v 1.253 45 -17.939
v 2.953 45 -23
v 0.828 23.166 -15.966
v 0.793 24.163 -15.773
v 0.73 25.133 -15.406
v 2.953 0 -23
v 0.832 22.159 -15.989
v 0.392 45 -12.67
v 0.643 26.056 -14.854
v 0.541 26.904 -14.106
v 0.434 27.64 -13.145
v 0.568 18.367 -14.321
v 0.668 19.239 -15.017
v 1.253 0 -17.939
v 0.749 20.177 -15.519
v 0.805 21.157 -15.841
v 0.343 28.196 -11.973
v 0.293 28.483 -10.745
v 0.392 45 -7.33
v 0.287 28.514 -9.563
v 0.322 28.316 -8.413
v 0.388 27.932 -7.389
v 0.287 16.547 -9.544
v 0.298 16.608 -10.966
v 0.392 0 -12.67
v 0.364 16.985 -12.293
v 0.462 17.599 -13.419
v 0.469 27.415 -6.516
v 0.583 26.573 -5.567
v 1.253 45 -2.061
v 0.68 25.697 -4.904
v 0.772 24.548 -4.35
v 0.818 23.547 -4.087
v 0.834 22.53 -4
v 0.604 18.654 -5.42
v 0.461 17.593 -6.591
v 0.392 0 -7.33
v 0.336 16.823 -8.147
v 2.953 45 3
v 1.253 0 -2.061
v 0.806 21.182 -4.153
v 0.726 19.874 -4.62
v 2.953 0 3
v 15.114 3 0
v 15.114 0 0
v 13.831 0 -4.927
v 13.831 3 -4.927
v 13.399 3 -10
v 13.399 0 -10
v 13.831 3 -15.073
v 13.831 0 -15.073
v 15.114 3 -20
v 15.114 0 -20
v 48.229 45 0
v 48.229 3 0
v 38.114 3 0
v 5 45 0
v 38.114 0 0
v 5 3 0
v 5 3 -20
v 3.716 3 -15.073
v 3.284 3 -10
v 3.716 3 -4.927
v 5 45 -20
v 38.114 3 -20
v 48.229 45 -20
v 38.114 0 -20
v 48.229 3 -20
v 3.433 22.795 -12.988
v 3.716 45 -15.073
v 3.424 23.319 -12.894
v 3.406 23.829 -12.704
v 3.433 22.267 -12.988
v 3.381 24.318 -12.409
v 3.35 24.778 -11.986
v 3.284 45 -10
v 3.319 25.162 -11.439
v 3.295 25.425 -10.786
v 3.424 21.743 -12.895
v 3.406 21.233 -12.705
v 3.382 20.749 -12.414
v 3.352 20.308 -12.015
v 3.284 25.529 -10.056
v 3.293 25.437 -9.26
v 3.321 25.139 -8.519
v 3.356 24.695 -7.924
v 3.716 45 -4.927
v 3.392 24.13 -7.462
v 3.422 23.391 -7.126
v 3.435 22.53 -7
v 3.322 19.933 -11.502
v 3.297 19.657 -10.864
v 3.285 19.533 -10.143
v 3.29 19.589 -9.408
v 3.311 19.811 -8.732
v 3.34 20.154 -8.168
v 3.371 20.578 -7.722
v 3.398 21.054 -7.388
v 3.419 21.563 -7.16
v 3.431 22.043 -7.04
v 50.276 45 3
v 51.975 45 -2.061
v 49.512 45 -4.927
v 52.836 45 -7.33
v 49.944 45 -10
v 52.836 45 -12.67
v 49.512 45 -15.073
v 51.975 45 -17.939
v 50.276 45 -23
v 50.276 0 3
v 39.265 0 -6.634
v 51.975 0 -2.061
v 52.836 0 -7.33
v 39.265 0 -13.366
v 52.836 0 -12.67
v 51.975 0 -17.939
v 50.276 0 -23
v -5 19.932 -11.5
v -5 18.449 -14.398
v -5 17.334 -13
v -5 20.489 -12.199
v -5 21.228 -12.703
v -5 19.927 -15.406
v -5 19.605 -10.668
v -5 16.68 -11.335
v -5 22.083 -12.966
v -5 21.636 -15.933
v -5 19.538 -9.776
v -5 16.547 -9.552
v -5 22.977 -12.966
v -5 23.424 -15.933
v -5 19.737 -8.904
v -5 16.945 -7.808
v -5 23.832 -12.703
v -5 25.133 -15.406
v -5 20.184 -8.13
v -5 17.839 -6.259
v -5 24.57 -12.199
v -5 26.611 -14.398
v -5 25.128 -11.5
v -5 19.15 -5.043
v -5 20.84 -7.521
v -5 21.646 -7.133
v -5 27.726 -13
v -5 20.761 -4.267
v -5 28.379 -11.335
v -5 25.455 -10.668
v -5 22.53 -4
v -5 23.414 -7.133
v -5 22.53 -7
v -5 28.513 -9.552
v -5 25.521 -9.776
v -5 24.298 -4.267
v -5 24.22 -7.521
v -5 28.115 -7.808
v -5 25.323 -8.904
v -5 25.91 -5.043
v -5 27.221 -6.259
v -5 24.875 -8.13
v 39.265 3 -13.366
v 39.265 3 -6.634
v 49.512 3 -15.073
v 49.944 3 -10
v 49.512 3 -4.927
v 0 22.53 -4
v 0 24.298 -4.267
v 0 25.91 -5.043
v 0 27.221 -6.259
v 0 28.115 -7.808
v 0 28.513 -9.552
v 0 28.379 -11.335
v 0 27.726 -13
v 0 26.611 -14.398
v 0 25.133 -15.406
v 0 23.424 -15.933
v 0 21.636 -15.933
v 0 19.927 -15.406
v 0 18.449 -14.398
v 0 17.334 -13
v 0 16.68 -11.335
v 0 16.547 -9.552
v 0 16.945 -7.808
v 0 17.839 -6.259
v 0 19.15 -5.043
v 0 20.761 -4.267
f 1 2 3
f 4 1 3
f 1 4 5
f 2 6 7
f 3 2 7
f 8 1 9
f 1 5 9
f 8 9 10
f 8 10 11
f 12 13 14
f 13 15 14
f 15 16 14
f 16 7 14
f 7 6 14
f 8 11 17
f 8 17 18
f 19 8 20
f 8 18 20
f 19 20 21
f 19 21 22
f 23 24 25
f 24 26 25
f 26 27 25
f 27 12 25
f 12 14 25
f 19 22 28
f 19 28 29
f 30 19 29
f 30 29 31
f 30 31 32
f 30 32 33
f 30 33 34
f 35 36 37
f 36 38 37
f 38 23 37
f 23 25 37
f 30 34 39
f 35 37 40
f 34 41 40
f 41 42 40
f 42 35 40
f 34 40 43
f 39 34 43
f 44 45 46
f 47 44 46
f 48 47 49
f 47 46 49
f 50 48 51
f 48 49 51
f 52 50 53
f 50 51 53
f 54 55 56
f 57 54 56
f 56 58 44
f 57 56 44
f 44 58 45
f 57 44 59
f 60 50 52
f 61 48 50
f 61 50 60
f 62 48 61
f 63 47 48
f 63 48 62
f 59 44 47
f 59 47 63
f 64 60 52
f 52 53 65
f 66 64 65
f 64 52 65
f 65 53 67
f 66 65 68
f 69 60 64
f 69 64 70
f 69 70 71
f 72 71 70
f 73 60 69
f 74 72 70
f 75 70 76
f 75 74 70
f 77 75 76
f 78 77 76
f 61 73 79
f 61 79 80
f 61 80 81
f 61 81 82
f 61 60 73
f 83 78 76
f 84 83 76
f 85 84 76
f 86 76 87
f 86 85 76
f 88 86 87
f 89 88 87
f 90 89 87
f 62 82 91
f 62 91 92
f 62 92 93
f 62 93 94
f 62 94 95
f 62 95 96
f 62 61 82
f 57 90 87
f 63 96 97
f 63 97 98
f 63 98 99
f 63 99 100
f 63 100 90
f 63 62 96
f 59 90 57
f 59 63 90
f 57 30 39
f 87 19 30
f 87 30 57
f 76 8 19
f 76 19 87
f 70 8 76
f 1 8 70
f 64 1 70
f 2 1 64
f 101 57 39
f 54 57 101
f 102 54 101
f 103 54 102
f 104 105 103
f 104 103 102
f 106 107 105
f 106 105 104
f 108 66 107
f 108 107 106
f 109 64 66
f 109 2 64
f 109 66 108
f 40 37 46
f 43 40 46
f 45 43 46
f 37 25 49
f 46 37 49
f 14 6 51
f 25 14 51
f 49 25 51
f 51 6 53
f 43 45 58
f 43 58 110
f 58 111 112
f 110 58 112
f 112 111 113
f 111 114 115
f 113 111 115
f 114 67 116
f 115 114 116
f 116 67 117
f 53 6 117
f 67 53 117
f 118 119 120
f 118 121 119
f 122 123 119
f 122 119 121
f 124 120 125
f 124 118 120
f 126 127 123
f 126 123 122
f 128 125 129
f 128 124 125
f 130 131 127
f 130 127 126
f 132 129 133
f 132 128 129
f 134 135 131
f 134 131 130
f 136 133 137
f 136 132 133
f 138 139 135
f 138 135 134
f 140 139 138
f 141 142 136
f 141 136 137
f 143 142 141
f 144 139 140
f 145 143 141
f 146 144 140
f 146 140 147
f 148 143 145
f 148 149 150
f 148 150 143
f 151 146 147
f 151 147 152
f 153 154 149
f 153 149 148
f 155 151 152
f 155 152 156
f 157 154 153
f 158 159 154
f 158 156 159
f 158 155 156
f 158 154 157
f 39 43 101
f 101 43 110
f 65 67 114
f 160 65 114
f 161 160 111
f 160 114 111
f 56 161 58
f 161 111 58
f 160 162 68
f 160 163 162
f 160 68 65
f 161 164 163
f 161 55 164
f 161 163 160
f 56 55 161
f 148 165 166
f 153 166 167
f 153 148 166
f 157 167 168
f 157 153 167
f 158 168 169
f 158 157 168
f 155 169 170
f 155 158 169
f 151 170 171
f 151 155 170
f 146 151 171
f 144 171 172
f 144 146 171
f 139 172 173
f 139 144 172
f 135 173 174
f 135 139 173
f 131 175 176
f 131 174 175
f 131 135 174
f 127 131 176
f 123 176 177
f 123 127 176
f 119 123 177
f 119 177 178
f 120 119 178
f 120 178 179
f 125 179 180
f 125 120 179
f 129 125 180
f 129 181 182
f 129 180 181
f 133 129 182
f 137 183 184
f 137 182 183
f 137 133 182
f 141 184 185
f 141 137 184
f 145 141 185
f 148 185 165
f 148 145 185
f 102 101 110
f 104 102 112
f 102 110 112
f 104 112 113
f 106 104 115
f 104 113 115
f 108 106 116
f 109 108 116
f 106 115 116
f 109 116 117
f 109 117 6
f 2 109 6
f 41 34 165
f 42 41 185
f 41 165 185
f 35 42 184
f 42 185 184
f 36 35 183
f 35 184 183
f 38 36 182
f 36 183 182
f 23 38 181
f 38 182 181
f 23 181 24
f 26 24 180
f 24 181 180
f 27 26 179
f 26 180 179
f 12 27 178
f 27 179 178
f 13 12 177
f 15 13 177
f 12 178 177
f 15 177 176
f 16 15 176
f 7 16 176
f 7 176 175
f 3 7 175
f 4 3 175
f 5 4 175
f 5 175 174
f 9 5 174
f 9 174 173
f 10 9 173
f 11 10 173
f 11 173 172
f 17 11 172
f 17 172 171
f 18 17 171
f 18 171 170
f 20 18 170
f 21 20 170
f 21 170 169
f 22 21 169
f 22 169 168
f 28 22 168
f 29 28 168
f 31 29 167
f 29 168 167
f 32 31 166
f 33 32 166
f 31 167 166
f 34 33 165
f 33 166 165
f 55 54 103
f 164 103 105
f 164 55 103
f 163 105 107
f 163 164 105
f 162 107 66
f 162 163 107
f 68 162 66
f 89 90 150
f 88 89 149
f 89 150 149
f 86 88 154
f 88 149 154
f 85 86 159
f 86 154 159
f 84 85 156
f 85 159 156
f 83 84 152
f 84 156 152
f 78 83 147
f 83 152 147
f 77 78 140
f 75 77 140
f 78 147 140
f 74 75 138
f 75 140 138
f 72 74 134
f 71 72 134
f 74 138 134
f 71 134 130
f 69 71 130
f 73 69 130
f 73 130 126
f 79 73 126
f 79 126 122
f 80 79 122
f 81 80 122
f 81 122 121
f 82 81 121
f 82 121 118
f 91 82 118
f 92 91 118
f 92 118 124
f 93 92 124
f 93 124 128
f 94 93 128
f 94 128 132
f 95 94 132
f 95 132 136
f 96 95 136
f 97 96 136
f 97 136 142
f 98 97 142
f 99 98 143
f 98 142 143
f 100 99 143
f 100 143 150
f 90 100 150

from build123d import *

# Parameters (mm, degrees)
SALIENTE_EXTRUIR1_DEPTH      = 45
SALIENTE_EXTRUIR2_DEPTH      = 3
SALIENTE_EXTRUIR3_REACH      = 75.192
SALIENTE_EXTRUIR3_END_RADIUS = 33
CROQUIS3_R                   = 6
SALIENTE_EXTRUIR4_START      = 5
CROQUIS4_R                   = 6
SALIENTE_EXTRUIR4_DEPTH      = 5
CROQUIS5_R                   = 3
CORTAR_EXTRUIR1_DEPTH        = 12


with BuildPart() as part:
    # Croquis1 → Saliente-Extruir1 (new body)
    with BuildSketch(Plane(origin=(0, 0, 0), x_dir=(1, 0, 0), z_dir=(0, 1, 0))):
        with BuildLine():
            Line((2.952769471, -3), (50.275773024, -3))
            ThreePointArc((50.275773024, -3), (52.944271247, 10), (50.275773024, 23))
            Line((50.275773024, 23), (2.952769471, 23))
            ThreePointArc((2.952769471, 23), (0.284271247, 10), (2.952769471, -3))
        make_face()
        with BuildLine():
            Line((5, 0), (48.228542495, 0))
            ThreePointArc((48.228542495, 0), (49.944271247, 10), (48.228542495, 20))
            Line((48.228542495, 20), (5, 20))
            ThreePointArc((5, 20), (3.284271247, 10), (5, 0))
        make_face(mode=Mode.SUBTRACT)
    extrude(amount=SALIENTE_EXTRUIR1_DEPTH)

    # Croquis2 → Saliente-Extruir2 (add)
    with BuildSketch(Plane.XZ):
        with BuildLine():
            Line((2.952769471, 3), (50.275773024, 3))
            ThreePointArc((50.275773024, 3), (52.944271247, -10), (50.275773024, -23))
            Line((50.275773024, -23), (2.952769471, -23))
            ThreePointArc((2.952769471, -23), (0.284271247, -10), (2.952769471, 3))
        make_face()
        with BuildLine():
            Line((15.114271247, -20), (38.114271247, -20))
            ThreePointArc((38.114271247, -20), (39.409874114, -10), (38.114271247, 0))
            Line((38.114271247, 0), (15.114271247, 0))
            ThreePointArc((15.114271247, 0), (13.398542495, -10), (15.114271247, -20))
        make_face(mode=Mode.SUBTRACT)
    extrude(amount=-SALIENTE_EXTRUIR2_DEPTH)

    # Saliente-Extruir3: up to this cylinder (the profile starts outside it)
    saliente_extruir3_end = Plane(origin=(33.284271247, 22.52988, -10), z_dir=(0, -1, 0)) * Cylinder(SALIENTE_EXTRUIR3_END_RADIUS, 217.384, mode=Mode.PRIVATE)
    # Croquis3 → Saliente-Extruir3 (add, up to the surface)
    with BuildSketch(Plane(origin=(0, 0, 0), x_dir=(0, 0, -1), z_dir=(1, 0, 0)), mode=Mode.PRIVATE) as saliente_extruir3_sk1:
        with Locations(Location((10, 22.52988005, 0), (0, 0, 180))):
            Circle(CROQUIS3_R)
    saliente_extruir3_tool1 = extrude(saliente_extruir3_sk1.sketch, amount=SALIENTE_EXTRUIR3_REACH, mode=Mode.PRIVATE) - saliente_extruir3_end
    add(saliente_extruir3_tool1.solids().sort_by_distance((0, 22.52988, -10))[0])

    # Croquis4 → Saliente-Extruir4 (add)
    with BuildSketch(Plane.ZY.offset(SALIENTE_EXTRUIR4_START)):
        with Locations((-10, 22.52988005)):
            Circle(CROQUIS4_R)
    extrude(amount=-SALIENTE_EXTRUIR4_DEPTH)

    # Croquis5 → Cortar-Extruir1 (cut)
    with BuildSketch(Plane.ZY.offset(5)):
        with Locations((-10, 22.52988005)):
            Circle(CROQUIS5_R)
    extrude(amount=-CORTAR_EXTRUIR1_DEPTH, mode=Mode.SUBTRACT)


solid = part.part
